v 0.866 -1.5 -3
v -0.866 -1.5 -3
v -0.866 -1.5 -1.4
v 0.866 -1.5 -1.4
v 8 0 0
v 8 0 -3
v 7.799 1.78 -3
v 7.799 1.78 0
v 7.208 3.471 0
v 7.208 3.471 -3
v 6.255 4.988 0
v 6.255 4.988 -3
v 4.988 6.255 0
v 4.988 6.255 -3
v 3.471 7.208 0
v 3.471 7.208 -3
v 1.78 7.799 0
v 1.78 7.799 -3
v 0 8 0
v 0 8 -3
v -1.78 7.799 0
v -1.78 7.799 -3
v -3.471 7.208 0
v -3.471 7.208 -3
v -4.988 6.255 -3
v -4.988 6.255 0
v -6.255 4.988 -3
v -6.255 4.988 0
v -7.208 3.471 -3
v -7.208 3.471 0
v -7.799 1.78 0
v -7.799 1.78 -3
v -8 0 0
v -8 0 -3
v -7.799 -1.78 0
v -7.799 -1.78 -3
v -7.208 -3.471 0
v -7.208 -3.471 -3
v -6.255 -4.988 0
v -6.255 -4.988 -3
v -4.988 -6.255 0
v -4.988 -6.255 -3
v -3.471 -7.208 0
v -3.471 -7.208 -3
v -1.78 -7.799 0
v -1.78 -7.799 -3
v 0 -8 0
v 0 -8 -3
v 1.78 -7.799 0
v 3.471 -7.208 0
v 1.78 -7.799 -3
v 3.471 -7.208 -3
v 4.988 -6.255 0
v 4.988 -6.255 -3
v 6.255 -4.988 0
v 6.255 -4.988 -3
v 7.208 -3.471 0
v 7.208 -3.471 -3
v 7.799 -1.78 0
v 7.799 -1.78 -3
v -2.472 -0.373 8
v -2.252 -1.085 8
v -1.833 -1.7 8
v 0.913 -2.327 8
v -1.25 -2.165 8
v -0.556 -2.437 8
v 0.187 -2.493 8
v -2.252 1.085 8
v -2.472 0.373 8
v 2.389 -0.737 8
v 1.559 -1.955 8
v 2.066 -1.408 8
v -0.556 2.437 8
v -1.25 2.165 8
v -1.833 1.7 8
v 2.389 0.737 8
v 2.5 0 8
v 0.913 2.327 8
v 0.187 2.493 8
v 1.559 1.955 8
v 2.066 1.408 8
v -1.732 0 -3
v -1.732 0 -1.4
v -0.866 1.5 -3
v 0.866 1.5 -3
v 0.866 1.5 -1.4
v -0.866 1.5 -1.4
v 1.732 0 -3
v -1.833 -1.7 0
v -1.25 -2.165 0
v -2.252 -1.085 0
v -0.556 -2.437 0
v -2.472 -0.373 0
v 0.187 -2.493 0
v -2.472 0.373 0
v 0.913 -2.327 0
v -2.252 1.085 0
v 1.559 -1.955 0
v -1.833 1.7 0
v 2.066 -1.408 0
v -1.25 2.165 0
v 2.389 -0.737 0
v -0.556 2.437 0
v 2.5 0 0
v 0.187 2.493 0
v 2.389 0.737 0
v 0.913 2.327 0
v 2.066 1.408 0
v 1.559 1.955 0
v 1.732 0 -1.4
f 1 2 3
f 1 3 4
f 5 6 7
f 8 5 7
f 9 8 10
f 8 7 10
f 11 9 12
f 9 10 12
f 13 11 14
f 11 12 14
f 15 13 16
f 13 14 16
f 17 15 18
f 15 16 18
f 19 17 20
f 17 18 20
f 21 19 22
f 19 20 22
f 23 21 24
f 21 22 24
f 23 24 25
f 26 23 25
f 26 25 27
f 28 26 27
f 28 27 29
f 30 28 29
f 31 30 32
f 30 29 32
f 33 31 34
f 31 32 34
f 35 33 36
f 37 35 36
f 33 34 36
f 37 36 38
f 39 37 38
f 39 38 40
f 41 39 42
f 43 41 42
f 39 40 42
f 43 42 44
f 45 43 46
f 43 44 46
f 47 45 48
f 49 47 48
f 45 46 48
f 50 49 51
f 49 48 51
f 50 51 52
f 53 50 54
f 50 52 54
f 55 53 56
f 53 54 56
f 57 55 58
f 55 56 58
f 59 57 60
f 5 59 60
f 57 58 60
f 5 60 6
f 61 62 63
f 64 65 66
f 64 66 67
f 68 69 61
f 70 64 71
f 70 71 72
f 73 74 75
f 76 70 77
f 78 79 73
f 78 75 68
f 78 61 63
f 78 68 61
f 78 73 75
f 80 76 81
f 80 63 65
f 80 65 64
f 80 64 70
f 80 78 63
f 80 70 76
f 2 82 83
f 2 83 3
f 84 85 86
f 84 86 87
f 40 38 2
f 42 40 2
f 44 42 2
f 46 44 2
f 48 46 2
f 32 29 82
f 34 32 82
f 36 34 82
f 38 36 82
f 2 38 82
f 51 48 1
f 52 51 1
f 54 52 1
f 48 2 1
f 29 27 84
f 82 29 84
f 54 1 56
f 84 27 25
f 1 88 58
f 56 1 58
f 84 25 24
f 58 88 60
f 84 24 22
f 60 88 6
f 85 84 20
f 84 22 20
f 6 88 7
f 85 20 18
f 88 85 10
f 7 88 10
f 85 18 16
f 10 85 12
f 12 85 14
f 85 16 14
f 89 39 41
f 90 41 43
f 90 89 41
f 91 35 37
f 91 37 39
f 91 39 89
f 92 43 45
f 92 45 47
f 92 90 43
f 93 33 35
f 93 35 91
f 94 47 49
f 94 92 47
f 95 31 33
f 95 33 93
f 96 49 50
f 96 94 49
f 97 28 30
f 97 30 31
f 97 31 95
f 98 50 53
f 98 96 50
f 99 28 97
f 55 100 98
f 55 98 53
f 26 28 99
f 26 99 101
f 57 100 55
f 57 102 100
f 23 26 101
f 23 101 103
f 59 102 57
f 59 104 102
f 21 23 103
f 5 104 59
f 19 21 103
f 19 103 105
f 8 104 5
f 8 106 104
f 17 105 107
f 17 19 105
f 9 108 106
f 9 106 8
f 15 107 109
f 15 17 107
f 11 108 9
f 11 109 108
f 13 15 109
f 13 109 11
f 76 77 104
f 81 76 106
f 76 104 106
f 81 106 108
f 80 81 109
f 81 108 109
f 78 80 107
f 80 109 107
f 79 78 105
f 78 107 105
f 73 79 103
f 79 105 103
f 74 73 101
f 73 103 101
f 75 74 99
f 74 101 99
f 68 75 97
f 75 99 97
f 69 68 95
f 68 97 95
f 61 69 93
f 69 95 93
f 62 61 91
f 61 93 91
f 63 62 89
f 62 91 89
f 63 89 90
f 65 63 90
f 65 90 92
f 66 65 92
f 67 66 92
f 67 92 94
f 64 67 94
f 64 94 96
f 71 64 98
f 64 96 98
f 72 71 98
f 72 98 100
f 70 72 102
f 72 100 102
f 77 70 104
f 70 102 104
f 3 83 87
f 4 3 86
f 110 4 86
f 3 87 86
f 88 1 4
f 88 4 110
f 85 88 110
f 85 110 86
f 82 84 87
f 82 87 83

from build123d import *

# Parameters (mm, degrees)
F_01_START                          = -3
S01_LOW_FLANGED_HEAD_R              = 8
F_01_LOW_FLANGED_HEAD_DEPTH         = 3
S02_M5_THREAD_MAJOR_DIAMETER_R      = 2.5
F_02_M5_THREAD_MAJOR_DIAMETER_DEPTH = 8
F_03_START                          = -3.1
F_03_DRIVE_HEX_DEPTH                = 1.7


with BuildPart() as part:
    # S01 - Low flanged head → 01 - Low flanged head (new body)
    with BuildSketch(Plane.XY.offset(F_01_START)):
        Circle(S01_LOW_FLANGED_HEAD_R)
    extrude(amount=F_01_LOW_FLANGED_HEAD_DEPTH)

    # S02 - M5 thread major diameter → 02 - M5 thread major diameter (add)
    with BuildSketch(Plane.XY):
        Circle(S02_M5_THREAD_MAJOR_DIAMETER_R)
    extrude(amount=F_02_M5_THREAD_MAJOR_DIAMETER_DEPTH)

    # S03 - Drive hex → 03 - Drive hex (cut)
    with BuildSketch(Plane.XY.offset(F_03_START)):
        Polygon((1.732050808, 0), (0.866025404, 1.5), (-0.866025404, 1.5), (-1.732050808, 0), (-0.866025404, -1.5), (0.866025404, -1.5), align=None)
    extrude(amount=F_03_DRIVE_HEX_DEPTH, mode=Mode.SUBTRACT)


solid = part.part
